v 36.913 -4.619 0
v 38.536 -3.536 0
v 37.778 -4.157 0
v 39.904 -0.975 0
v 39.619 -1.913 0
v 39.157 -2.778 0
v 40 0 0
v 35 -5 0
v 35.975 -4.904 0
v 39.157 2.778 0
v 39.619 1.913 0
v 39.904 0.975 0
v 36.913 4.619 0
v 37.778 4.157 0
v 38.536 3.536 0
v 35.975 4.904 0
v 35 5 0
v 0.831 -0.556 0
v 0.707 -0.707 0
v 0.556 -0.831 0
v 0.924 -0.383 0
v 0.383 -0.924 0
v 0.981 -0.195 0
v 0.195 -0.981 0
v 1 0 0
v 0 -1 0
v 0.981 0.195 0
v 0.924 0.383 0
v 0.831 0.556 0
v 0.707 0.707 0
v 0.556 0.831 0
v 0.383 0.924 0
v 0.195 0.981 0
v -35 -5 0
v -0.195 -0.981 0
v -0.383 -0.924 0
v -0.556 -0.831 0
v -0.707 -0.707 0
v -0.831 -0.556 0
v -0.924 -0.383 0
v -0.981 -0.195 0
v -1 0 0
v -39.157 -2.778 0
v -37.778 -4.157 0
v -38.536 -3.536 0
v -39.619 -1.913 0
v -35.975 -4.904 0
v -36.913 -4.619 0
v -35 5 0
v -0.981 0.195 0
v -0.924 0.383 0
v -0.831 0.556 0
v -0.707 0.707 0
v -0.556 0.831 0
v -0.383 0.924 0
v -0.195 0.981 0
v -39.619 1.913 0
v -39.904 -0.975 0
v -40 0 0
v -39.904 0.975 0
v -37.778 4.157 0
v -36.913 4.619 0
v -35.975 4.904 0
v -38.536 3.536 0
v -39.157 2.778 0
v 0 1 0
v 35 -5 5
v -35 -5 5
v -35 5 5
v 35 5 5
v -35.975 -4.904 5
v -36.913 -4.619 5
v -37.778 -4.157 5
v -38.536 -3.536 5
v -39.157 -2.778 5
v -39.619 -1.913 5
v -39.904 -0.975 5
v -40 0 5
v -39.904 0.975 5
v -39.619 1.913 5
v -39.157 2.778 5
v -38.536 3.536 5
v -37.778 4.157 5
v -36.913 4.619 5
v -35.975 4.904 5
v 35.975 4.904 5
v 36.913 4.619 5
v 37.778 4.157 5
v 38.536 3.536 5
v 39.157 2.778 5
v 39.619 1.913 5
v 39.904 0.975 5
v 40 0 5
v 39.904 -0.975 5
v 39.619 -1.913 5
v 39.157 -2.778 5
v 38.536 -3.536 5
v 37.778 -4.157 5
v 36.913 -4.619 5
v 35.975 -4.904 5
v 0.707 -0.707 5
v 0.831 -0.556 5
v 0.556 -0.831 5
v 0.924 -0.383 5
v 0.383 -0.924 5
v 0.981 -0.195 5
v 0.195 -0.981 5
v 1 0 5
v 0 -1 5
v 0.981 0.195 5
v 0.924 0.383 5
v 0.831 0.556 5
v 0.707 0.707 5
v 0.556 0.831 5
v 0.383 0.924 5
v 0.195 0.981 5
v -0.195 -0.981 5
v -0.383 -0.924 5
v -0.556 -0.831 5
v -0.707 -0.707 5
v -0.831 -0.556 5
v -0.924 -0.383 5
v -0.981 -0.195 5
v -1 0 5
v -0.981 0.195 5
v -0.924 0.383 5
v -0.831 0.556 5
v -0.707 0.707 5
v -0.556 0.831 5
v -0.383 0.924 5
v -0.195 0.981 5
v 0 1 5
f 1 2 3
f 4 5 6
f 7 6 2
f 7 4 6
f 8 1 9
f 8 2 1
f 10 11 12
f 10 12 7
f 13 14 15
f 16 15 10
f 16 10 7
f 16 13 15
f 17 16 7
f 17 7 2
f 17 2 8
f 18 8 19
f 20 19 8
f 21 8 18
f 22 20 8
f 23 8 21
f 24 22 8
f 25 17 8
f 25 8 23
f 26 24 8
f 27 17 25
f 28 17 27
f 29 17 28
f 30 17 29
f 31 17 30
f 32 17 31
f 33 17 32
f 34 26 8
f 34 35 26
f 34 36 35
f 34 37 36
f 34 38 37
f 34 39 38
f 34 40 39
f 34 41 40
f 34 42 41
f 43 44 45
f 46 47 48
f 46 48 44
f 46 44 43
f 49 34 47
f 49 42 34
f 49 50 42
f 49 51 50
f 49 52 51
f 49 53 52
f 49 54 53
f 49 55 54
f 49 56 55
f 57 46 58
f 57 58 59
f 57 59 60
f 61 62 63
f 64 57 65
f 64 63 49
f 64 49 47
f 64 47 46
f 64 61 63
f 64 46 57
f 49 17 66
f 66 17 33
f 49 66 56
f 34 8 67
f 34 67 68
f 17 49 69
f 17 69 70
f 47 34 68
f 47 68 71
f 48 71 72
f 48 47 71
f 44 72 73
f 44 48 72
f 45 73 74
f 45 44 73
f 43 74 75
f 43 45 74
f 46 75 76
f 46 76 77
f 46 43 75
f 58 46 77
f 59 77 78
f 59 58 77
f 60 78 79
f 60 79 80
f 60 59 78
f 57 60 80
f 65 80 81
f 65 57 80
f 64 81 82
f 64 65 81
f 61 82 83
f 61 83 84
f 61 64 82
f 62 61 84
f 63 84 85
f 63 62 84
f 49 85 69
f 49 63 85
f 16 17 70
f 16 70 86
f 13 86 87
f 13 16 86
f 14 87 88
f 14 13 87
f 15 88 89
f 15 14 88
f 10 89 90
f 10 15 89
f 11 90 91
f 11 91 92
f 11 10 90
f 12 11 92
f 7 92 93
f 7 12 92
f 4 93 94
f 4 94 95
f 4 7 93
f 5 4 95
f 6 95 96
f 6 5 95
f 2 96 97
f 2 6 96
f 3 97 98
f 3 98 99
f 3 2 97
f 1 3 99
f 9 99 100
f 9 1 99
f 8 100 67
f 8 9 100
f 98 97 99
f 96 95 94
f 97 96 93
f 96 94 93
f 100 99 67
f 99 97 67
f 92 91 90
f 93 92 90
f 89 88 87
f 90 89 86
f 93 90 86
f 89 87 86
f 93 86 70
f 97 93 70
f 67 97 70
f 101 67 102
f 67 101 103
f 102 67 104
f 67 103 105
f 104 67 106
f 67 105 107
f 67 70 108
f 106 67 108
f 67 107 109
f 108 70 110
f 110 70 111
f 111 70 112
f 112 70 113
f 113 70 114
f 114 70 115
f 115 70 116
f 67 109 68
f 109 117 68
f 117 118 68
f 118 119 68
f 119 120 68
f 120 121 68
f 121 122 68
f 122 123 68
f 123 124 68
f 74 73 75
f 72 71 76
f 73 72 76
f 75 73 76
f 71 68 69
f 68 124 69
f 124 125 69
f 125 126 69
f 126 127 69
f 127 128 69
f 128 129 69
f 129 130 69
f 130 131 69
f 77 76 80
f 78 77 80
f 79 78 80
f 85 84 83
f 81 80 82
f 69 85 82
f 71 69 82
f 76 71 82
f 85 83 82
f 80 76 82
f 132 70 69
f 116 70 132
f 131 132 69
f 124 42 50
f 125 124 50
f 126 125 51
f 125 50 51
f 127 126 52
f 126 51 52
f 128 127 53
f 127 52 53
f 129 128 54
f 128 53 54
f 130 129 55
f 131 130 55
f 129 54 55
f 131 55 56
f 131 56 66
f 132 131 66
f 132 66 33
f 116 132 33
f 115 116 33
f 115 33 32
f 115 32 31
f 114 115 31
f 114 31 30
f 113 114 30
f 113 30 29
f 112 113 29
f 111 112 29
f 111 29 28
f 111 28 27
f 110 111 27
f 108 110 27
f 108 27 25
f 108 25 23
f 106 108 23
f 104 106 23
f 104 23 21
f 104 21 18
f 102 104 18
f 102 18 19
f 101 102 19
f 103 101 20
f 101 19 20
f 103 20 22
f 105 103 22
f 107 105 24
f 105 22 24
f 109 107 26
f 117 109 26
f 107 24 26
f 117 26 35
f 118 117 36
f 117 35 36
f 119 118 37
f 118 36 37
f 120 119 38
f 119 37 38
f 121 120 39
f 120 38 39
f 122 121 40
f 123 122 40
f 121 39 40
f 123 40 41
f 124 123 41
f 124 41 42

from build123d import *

# Parameters (mm, degrees)
SALIENTE_EXTRUIR2_DEPTH = 5
CROQUIS2_R              = 1
CORTAR_EXTRUIR1_DEPTH   = 10


with BuildPart() as part:
    # Croquis1 → Saliente-Extruir2 (new body)
    with BuildSketch(Plane.XY):
        with BuildLine():
            Line((-35, 5), (35, 5))
            ThreePointArc((35, 5), (40, 0), (35, -5))
            Line((35, -5), (-35, -5))
            ThreePointArc((-35, -5), (-40, 0), (-35, 5))
        make_face()
    extrude(amount=SALIENTE_EXTRUIR2_DEPTH)

    # Croquis2 → Cortar-Extruir1 (cut)
    with BuildSketch(Plane(origin=(0, 0, 0), x_dir=(-1, 0, 0), z_dir=(0, 0, -1))):
        Circle(CROQUIS2_R)
    extrude(amount=-CORTAR_EXTRUIR1_DEPTH, mode=Mode.SUBTRACT)


solid = part.part
